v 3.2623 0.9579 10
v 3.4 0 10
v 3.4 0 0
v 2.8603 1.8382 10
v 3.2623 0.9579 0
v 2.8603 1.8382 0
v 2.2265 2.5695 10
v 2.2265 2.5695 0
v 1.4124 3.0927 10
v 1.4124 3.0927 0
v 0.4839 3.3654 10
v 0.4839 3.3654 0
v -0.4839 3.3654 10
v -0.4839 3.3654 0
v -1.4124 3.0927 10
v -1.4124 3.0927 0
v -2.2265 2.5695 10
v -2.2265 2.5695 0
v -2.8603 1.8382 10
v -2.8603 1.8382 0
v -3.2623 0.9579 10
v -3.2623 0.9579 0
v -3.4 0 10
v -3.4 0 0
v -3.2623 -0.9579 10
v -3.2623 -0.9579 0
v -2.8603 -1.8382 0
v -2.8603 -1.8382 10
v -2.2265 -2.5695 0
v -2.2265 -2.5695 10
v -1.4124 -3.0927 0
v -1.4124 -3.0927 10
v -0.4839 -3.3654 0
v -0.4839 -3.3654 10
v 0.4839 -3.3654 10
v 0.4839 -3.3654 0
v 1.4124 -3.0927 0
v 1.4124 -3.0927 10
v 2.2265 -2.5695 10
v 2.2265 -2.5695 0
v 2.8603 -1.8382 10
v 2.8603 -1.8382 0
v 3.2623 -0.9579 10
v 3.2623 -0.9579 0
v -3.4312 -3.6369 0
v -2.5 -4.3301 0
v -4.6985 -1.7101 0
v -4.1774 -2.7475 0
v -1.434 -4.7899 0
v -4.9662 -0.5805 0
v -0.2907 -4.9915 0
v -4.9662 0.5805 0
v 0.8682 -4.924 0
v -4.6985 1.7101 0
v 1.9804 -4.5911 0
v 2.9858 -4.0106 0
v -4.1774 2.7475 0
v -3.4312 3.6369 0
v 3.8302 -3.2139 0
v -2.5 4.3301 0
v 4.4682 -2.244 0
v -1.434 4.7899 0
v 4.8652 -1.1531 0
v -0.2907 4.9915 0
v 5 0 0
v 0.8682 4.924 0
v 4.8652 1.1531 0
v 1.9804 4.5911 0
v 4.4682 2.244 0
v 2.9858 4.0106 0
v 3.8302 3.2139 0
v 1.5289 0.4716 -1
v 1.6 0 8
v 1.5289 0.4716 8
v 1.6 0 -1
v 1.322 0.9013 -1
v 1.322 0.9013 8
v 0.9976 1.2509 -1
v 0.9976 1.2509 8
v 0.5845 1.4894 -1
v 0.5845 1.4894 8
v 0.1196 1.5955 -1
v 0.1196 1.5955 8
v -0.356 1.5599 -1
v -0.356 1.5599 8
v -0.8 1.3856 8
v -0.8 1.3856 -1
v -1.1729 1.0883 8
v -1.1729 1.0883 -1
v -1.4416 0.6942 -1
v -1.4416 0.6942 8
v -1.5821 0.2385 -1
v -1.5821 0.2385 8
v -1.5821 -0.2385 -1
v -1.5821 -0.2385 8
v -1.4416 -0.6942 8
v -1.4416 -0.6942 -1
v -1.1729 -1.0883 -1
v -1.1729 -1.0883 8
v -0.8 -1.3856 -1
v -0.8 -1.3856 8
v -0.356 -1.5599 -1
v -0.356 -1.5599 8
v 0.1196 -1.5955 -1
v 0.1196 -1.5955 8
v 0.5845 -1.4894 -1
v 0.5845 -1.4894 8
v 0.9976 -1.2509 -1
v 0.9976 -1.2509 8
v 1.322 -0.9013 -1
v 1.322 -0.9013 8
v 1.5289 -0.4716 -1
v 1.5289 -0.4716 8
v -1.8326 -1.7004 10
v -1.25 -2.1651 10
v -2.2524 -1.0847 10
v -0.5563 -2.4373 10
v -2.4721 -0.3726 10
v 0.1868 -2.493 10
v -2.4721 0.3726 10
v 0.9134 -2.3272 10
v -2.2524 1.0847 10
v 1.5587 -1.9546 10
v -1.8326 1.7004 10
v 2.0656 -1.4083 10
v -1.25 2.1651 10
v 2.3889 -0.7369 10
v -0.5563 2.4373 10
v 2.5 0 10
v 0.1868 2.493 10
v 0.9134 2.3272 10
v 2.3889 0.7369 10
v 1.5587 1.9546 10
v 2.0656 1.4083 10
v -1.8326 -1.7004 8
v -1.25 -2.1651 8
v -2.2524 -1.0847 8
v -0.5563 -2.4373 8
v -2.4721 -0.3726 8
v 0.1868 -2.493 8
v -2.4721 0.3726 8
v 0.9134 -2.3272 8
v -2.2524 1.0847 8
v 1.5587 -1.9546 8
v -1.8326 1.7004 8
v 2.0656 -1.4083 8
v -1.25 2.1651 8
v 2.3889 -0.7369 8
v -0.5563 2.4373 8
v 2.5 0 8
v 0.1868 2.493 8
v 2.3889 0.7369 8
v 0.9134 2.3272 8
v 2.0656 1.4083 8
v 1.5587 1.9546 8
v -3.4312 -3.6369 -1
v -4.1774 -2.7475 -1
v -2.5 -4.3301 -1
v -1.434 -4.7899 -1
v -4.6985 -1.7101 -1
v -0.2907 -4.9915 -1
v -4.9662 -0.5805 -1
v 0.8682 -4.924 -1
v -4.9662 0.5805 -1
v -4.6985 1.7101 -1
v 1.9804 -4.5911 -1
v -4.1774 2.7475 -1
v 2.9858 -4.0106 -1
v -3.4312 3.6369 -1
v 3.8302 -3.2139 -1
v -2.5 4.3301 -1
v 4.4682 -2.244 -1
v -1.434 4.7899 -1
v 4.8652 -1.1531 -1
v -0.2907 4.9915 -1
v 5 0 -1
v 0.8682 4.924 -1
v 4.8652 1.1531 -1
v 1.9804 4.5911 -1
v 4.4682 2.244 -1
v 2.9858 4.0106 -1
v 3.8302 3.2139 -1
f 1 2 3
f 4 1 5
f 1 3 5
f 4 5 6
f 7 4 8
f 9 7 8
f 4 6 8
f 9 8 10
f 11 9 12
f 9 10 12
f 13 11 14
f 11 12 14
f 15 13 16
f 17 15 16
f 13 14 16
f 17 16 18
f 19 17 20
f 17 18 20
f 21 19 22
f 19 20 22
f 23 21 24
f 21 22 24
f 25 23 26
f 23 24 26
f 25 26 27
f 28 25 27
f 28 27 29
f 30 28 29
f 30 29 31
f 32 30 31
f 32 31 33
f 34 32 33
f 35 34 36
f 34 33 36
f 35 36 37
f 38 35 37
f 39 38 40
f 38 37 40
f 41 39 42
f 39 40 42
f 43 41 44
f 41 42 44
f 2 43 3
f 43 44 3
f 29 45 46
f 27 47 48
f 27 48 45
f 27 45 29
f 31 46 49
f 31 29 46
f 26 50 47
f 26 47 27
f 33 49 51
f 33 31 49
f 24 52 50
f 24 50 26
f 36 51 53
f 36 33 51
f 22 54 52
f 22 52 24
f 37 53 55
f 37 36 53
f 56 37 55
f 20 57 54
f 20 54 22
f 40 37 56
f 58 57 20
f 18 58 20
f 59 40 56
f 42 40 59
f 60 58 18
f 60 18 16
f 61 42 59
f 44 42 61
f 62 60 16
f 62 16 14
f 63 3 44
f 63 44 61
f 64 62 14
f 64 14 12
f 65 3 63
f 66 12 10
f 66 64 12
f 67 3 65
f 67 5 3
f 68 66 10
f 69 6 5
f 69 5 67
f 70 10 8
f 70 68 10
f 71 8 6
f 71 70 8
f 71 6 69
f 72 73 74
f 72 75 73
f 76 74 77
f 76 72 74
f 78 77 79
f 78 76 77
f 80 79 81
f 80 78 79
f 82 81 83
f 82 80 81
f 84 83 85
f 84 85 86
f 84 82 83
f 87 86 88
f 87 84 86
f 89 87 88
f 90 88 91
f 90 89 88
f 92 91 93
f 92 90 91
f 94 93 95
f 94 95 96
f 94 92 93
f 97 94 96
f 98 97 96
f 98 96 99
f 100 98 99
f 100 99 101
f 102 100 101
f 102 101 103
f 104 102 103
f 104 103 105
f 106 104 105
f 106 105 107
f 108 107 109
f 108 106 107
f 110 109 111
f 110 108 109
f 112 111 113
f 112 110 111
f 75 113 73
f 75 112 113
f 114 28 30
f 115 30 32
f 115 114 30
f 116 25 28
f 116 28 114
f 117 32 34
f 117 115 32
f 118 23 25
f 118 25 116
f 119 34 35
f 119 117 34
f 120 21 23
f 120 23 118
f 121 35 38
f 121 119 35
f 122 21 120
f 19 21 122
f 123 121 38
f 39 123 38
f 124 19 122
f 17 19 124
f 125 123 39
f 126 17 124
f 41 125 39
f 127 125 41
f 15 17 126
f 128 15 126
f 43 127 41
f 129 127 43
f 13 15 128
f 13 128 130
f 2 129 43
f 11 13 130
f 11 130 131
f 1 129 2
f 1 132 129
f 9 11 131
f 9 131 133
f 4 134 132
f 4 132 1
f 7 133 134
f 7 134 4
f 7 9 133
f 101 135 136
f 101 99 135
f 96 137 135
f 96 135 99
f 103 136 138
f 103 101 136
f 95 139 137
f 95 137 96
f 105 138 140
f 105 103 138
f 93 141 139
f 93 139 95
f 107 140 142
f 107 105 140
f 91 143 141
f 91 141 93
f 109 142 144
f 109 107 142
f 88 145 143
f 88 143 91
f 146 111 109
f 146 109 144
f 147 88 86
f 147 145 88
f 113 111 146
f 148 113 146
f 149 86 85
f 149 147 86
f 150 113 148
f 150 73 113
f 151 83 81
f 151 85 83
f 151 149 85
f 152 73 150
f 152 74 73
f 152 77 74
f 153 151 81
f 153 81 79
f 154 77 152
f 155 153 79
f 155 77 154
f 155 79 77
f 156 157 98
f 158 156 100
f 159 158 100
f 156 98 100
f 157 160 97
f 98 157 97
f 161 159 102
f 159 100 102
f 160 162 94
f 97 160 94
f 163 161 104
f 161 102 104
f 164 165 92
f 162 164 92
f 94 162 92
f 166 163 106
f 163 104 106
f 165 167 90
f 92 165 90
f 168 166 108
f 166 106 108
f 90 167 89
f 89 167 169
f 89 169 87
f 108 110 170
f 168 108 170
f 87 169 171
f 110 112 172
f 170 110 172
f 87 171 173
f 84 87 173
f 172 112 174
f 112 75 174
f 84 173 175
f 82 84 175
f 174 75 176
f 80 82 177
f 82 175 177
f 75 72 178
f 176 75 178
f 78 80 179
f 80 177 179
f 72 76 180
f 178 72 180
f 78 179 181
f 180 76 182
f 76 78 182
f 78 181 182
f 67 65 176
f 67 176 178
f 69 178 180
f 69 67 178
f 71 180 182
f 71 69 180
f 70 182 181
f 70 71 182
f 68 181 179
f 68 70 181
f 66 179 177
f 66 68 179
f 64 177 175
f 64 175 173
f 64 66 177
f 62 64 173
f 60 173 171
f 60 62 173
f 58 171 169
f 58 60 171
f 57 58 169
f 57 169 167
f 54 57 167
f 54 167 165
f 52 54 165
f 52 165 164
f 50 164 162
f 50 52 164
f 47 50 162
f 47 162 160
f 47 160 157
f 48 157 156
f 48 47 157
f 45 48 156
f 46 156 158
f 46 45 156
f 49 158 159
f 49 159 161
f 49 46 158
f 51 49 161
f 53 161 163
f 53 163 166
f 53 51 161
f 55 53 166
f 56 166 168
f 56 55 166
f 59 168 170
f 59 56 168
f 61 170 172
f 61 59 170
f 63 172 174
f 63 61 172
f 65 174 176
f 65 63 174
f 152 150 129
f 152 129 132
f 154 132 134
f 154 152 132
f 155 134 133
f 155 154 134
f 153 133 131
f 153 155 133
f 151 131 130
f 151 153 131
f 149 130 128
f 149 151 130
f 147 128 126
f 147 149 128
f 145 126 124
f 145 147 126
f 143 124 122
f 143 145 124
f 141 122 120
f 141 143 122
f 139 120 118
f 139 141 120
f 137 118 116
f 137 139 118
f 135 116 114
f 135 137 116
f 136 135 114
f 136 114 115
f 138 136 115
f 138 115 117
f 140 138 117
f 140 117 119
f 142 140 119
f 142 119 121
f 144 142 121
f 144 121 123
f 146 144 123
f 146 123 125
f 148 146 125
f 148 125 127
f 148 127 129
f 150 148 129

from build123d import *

# Parameters (mm, degrees)
SKETCH1_R           = 5
SKETCH1_R_2         = 1.6
BOSS_EXTRUDE1_DEPTH = 1
SKETCH1_3_R         = 3.4
SKETCH1_3_R_2       = 2.5
BOSS_EXTRUDE2_DEPTH = 10
SKETCH1_4_R         = 2.5
SKETCH1_4_R_2       = 1.6
BOSS_EXTRUDE3_DEPTH = 8


with BuildPart() as part:
    # Sketch1 → Boss-Extrude1 (new body)
    with BuildSketch(Plane.XY):
        Circle(SKETCH1_R)
        Circle(SKETCH1_R_2, mode=Mode.SUBTRACT)
    extrude(amount=-BOSS_EXTRUDE1_DEPTH)

    # Sketch1<3> → Boss-Extrude2 (add)
    with BuildSketch(Plane.XY):
        Circle(SKETCH1_3_R)
        Circle(SKETCH1_3_R_2, mode=Mode.SUBTRACT)
    extrude(amount=BOSS_EXTRUDE2_DEPTH)

    # Sketch1<4> → Boss-Extrude3 (add)
    with BuildSketch(Plane.XY):
        Circle(SKETCH1_4_R)
        Circle(SKETCH1_4_R_2, mode=Mode.SUBTRACT)
    extrude(amount=BOSS_EXTRUDE3_DEPTH)


solid = part.part
